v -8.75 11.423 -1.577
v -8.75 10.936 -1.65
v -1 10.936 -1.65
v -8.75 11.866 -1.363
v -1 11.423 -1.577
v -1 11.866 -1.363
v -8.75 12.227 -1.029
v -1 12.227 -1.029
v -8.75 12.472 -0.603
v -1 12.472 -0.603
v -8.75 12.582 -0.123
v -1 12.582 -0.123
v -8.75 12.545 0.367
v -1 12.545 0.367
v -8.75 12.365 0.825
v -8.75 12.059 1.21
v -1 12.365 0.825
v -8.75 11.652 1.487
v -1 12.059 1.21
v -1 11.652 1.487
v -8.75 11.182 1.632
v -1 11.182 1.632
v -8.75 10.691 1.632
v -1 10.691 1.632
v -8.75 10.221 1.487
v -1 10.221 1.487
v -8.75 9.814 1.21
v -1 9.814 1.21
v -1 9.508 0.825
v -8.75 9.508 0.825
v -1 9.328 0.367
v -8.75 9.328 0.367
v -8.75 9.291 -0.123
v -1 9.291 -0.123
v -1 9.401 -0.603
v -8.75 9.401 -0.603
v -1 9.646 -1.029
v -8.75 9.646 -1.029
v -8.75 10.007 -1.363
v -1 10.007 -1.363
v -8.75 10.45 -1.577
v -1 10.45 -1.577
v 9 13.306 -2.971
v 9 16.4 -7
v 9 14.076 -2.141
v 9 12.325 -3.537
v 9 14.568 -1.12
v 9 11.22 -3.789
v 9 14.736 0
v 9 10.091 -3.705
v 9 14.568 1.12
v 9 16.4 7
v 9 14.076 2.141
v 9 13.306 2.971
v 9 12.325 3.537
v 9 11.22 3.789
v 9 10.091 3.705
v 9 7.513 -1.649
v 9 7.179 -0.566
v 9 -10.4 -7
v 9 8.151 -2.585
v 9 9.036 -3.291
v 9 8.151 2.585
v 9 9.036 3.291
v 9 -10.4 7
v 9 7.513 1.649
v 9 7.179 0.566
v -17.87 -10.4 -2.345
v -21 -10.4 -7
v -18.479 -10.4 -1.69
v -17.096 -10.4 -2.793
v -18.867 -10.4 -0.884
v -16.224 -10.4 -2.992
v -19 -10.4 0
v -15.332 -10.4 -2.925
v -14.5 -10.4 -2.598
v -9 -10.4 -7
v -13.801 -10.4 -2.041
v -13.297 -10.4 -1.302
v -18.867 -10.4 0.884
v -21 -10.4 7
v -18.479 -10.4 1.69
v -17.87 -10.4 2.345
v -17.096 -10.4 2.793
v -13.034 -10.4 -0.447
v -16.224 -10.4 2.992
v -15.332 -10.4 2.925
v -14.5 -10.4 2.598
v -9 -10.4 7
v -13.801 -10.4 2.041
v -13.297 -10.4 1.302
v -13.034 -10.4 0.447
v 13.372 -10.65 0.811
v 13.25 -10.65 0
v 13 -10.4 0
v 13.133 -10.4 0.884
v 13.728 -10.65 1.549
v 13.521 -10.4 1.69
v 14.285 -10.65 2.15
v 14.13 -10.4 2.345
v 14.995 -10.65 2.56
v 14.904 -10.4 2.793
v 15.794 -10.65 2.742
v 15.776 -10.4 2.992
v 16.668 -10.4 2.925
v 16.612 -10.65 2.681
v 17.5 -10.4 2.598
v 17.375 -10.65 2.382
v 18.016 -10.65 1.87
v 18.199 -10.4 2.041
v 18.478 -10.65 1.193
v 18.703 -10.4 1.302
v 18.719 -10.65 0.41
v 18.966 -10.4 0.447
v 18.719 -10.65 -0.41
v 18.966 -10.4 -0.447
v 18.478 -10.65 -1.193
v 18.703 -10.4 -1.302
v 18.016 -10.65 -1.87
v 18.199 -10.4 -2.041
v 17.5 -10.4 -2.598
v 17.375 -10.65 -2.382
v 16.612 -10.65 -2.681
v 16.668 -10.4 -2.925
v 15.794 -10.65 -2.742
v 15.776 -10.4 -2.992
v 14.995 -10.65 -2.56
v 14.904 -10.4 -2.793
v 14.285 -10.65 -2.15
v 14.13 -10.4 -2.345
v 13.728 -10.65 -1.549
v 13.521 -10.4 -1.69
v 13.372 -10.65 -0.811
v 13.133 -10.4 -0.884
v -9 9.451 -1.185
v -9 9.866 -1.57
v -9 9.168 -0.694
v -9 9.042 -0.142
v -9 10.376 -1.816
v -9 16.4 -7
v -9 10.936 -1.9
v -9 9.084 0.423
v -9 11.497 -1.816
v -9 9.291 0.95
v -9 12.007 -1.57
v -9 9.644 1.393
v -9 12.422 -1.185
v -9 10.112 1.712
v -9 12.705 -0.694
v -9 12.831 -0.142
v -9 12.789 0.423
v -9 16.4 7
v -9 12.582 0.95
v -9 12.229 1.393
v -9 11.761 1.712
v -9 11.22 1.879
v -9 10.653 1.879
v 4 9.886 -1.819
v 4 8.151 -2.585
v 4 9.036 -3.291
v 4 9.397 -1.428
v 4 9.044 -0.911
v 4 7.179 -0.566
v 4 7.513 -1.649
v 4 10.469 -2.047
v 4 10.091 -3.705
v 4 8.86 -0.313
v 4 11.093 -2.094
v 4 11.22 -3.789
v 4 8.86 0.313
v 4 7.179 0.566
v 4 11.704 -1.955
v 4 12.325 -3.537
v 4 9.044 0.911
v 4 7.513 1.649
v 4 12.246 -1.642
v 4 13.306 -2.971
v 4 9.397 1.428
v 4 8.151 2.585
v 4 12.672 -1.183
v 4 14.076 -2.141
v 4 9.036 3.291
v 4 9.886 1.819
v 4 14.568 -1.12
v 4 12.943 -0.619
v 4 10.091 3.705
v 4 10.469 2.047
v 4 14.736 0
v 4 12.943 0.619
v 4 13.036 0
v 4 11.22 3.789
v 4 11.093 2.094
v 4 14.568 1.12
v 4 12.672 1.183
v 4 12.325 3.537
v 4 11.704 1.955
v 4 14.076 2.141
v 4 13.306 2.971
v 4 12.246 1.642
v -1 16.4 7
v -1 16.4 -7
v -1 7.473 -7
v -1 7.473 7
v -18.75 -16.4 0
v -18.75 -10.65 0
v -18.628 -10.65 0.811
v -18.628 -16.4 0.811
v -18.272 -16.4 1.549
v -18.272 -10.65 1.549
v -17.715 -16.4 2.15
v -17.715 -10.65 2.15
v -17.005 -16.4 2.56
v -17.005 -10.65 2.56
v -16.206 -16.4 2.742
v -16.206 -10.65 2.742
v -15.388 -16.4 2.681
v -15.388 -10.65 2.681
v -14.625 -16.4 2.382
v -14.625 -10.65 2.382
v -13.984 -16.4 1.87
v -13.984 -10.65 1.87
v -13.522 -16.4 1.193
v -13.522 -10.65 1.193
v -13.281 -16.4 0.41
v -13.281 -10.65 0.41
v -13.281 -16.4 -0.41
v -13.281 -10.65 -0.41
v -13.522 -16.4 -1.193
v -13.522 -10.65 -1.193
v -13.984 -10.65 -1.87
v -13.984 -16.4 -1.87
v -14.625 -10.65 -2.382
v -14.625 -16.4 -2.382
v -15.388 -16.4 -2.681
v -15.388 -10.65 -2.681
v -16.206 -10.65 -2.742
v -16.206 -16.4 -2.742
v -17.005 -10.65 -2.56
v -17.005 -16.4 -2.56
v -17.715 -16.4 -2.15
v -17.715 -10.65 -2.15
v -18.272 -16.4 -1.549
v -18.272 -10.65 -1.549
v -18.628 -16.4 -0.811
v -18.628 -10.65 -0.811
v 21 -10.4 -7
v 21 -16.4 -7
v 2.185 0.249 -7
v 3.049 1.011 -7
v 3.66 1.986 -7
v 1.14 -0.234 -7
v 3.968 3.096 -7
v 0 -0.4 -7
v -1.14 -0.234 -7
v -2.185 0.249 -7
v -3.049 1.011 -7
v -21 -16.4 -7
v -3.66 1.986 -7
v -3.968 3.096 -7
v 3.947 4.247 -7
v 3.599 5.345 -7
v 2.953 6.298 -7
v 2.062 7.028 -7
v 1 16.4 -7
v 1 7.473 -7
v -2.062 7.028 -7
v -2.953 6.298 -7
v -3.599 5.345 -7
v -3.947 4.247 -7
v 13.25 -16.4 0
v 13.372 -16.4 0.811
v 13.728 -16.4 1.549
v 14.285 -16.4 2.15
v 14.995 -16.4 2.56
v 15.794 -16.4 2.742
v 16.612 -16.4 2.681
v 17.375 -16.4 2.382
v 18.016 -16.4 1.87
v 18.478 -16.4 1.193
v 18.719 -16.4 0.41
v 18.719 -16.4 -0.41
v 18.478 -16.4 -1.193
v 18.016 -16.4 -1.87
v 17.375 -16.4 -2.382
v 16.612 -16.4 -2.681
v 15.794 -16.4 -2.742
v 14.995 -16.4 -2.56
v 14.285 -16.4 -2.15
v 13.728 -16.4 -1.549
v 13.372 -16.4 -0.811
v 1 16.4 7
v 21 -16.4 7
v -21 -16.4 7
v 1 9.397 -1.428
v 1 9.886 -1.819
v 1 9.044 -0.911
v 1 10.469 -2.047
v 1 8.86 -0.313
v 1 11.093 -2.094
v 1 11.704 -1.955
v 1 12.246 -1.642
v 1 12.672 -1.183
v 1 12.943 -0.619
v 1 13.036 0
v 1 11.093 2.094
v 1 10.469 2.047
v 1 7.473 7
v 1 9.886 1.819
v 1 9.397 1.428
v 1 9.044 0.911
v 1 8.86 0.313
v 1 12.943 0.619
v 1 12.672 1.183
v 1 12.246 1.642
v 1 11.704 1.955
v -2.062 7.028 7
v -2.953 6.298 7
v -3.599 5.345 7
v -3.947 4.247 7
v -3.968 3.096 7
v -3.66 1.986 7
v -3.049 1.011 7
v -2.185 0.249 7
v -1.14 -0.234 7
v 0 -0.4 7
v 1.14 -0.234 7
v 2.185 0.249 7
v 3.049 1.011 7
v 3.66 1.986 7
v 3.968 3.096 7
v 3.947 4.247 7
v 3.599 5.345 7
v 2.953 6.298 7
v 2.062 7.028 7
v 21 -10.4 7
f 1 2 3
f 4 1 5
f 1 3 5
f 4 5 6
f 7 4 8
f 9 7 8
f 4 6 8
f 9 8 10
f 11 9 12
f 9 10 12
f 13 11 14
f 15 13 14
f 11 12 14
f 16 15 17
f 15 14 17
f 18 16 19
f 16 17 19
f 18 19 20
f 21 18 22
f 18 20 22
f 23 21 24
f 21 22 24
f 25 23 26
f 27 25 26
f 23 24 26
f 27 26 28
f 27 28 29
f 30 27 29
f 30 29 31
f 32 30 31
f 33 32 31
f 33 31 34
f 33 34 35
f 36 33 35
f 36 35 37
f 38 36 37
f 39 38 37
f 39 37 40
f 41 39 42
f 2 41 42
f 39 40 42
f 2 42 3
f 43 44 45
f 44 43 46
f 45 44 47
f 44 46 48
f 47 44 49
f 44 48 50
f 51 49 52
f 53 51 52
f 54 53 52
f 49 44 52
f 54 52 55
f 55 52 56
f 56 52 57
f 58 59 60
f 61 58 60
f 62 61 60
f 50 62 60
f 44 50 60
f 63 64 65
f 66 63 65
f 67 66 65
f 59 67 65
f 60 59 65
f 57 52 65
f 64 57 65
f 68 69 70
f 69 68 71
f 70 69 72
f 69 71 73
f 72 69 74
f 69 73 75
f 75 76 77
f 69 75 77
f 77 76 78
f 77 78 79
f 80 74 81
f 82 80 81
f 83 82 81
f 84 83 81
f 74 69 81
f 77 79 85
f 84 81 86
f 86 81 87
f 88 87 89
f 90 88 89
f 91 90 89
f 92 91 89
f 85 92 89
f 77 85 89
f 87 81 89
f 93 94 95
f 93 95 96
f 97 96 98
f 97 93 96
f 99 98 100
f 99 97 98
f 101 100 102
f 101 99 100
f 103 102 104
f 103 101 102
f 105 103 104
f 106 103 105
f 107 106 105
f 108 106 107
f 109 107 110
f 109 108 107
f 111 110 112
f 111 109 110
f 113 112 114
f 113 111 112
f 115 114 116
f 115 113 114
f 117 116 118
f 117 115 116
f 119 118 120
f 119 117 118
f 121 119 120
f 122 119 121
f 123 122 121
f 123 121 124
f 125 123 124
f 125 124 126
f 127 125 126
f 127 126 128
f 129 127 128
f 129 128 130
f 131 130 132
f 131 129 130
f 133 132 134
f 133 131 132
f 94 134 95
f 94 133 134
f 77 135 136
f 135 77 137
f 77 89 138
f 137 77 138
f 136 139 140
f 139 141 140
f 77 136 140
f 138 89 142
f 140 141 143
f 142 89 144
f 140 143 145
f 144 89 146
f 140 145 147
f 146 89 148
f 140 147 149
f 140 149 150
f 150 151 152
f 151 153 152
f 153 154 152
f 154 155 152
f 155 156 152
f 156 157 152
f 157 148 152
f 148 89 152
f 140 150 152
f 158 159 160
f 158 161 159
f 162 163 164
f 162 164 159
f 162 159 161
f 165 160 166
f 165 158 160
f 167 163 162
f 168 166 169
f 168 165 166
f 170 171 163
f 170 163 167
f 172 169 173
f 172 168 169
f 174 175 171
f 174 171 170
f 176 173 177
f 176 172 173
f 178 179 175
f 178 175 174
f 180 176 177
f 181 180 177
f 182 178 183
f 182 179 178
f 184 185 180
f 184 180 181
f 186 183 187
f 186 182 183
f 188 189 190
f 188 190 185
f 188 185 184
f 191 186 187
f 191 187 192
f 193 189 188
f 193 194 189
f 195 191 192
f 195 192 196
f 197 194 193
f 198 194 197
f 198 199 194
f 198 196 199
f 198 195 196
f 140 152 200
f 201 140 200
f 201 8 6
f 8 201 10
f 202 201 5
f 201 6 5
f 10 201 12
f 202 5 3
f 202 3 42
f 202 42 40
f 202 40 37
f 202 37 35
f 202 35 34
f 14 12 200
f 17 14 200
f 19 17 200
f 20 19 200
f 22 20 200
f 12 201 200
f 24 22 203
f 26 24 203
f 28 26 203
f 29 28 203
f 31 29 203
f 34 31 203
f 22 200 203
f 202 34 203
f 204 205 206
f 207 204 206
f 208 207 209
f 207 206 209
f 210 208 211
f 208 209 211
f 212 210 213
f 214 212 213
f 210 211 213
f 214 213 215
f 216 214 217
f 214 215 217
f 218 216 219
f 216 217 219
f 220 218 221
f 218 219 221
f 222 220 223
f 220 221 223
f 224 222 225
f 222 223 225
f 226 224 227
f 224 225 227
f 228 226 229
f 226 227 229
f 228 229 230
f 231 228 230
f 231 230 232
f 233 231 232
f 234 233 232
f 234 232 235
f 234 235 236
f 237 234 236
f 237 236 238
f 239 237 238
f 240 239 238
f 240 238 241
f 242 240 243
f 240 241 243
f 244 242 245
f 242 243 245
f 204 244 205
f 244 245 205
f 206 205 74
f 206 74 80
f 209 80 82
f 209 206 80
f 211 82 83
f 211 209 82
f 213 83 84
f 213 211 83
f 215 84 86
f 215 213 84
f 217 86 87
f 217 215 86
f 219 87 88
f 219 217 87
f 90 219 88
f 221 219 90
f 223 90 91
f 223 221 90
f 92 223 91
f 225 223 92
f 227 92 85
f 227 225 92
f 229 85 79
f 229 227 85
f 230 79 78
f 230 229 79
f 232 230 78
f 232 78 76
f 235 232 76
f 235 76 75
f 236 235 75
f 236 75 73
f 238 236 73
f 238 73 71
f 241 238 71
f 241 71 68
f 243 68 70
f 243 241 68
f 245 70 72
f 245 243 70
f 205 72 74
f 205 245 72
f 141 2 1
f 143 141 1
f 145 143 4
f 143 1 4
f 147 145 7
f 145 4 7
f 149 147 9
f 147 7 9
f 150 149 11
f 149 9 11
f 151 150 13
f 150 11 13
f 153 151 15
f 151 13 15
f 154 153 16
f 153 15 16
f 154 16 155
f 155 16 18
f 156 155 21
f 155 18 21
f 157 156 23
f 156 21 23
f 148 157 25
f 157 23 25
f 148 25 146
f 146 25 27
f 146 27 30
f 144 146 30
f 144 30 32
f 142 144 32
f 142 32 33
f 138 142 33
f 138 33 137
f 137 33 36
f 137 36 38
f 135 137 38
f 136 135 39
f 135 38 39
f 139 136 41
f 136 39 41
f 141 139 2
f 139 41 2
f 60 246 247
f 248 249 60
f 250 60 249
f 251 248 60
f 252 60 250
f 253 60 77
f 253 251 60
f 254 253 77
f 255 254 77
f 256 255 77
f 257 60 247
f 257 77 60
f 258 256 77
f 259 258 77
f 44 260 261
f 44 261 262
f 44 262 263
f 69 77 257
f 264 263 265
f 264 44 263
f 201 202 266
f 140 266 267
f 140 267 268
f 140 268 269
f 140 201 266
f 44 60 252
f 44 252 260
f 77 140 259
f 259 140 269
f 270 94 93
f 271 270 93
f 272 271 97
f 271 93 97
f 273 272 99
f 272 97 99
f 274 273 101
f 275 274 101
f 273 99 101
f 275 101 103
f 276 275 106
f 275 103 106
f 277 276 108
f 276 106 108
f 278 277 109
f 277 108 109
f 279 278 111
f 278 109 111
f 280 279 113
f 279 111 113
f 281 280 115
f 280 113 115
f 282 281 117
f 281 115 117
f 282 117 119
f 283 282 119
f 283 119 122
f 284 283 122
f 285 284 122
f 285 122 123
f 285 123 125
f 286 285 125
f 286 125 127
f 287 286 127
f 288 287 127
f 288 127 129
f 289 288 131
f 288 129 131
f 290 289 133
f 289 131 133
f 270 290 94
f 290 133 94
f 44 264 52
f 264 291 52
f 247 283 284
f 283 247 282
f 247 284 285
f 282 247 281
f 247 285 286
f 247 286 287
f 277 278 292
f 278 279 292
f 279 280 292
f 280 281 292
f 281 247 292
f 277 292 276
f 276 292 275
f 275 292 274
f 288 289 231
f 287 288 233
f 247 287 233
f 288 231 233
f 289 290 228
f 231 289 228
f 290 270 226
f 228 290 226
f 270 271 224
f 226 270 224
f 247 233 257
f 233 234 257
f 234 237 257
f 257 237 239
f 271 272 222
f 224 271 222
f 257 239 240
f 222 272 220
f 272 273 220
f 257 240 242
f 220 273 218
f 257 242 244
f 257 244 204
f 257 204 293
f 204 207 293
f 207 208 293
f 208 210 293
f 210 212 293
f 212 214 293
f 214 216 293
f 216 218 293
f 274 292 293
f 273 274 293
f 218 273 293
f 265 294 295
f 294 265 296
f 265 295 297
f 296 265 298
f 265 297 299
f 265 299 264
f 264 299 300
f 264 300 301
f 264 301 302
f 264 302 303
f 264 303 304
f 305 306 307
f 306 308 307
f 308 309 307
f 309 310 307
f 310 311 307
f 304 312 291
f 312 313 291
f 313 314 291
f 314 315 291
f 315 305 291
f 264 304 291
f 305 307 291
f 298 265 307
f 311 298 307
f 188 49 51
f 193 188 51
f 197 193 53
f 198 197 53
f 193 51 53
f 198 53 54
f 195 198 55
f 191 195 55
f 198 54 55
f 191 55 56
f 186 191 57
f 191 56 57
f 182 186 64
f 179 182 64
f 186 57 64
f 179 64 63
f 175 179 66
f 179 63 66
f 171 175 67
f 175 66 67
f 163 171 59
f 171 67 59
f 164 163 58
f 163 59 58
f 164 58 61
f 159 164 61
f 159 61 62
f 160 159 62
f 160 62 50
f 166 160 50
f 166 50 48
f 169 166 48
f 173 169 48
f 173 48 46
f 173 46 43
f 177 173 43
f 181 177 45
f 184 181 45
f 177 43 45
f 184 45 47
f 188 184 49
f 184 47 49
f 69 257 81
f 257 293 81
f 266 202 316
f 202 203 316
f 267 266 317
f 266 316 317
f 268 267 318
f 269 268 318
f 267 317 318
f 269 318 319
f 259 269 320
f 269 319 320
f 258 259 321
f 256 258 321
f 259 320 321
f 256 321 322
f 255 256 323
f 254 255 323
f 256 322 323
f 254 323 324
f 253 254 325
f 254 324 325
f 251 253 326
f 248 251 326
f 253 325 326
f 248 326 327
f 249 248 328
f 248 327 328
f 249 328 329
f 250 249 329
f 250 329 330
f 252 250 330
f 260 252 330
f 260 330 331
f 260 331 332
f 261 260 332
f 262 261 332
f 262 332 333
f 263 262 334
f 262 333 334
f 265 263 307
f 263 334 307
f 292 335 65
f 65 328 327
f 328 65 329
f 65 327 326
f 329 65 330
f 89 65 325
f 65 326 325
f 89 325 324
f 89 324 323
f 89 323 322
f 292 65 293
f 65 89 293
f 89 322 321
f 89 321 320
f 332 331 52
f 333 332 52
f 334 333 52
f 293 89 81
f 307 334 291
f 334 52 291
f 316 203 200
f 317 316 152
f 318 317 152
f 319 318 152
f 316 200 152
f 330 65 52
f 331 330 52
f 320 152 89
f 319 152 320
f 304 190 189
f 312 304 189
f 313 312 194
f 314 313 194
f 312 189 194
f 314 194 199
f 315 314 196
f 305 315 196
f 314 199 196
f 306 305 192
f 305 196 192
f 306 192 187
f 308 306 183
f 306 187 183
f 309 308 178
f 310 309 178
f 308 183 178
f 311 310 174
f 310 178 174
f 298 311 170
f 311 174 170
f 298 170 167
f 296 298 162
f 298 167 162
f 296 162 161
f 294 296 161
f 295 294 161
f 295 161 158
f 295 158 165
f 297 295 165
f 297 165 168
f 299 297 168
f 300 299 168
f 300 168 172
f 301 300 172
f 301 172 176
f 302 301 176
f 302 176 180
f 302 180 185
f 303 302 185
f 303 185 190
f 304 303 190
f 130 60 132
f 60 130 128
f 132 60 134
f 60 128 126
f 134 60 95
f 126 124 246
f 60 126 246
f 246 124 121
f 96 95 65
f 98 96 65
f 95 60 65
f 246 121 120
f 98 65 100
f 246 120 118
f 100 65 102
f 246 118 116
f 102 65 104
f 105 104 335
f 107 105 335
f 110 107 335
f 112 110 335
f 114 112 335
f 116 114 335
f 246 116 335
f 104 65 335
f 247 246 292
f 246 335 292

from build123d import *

# Parameters (mm, degrees)
EXTRUDE_1_DEPTH     = 7
SKETCH_2_R          = 2.75
CUT_EXTRUDE_1_DEPTH = 6
SKETCH_4_R          = 1.65
CUT_EXTRUDE_2_DEPTH = 8
SKETCH_5_R          = 2.1
CUT_EXTRUDE_3_DEPTH = 8
SKETCH_6_R          = 3.8
CUT_EXTRUDE_4_DEPTH = 5
CHAMFER_1_SIZE      = 0.25


with BuildPart() as part:
    # Эскиз1 → Бобышка-Вытянуть1 (new, symmetric)
    with BuildSketch(Plane.XY):
        with BuildLine():
            Line((-9, 16.4), (-1, 16.4))
            Line((-1, 16.4), (-1, 7.472983346))
            ThreePointArc((-1, 7.472983346), (0, -0.4), (1, 7.472983346))
            Line((1, 7.472983346), (1, 16.4))
            Line((1, 16.4), (9, 16.4))
            Line((9, 16.4), (9, -10.4))
            Line((9, -10.4), (21, -10.4))
            Line((21, -10.4), (21, -16.4))
            Line((21, -16.4), (-21, -16.4))
            Line((-21, -16.4), (-21, -10.4))
            Line((-21, -10.4), (-9, -10.4))
            Line((-9, -10.4), (-9, 16.4))
        make_face()
    extrude(amount=EXTRUDE_1_DEPTH, both=True)

    # Эскиз2 → Вырез-Вытянуть1 (cut)
    with BuildSketch(Plane(origin=(0, -10.4, 0), x_dir=(1, 0, 0), z_dir=(0, 1, 0))):
        with Locations(Location((-16, 0, 0), (0, 0, 180))):
            Circle(SKETCH_2_R)
        with Locations(Location((16, 0, 0), (0, 0, 180))):
            Circle(SKETCH_2_R)
    extrude(amount=-CUT_EXTRUDE_1_DEPTH, mode=Mode.SUBTRACT)

    # Эскиз4 → Вырез-Вытянуть2 (cut)
    with BuildSketch(Plane(origin=(-1, 0, 0), x_dir=(0, 0, -1), z_dir=(1, 0, 0))):
        with Locations((0, 10.936491673)):
            Circle(SKETCH_4_R)
    extrude(amount=-CUT_EXTRUDE_2_DEPTH, mode=Mode.SUBTRACT)

    # Эскиз5 → Вырез-Вытянуть3 (cut)
    with BuildSketch(Plane(origin=(9, 0, 0), x_dir=(0, 0, -1), z_dir=(1, 0, 0))):
        with Locations(Location((0, 10.936491673, 0), (0, 0, 90))):
            Circle(SKETCH_5_R)
    extrude(amount=-CUT_EXTRUDE_3_DEPTH, mode=Mode.SUBTRACT)

    # Эскиз6 → Вырез-Вытянуть4 (cut)
    with BuildSketch(Plane(origin=(9, 0, 0), x_dir=(0, 0, -1), z_dir=(1, 0, 0))):
        with Locations(Location((0, 10.936491673, 0), (0, 0, 90))):
            Circle(SKETCH_6_R)
    extrude(amount=-CUT_EXTRUDE_4_DEPTH, mode=Mode.SUBTRACT)

    # Фаска1
    chamfer_1_edges = [part.edges().sort_by_distance(p)[0] for p in [
        (-13.25, -10.4, 0),
        (18.75, -10.4, 0),
        (-9, 10.936491673, 1.65),
    ]]
    chamfer(chamfer_1_edges, length=CHAMFER_1_SIZE)


solid = part.part
